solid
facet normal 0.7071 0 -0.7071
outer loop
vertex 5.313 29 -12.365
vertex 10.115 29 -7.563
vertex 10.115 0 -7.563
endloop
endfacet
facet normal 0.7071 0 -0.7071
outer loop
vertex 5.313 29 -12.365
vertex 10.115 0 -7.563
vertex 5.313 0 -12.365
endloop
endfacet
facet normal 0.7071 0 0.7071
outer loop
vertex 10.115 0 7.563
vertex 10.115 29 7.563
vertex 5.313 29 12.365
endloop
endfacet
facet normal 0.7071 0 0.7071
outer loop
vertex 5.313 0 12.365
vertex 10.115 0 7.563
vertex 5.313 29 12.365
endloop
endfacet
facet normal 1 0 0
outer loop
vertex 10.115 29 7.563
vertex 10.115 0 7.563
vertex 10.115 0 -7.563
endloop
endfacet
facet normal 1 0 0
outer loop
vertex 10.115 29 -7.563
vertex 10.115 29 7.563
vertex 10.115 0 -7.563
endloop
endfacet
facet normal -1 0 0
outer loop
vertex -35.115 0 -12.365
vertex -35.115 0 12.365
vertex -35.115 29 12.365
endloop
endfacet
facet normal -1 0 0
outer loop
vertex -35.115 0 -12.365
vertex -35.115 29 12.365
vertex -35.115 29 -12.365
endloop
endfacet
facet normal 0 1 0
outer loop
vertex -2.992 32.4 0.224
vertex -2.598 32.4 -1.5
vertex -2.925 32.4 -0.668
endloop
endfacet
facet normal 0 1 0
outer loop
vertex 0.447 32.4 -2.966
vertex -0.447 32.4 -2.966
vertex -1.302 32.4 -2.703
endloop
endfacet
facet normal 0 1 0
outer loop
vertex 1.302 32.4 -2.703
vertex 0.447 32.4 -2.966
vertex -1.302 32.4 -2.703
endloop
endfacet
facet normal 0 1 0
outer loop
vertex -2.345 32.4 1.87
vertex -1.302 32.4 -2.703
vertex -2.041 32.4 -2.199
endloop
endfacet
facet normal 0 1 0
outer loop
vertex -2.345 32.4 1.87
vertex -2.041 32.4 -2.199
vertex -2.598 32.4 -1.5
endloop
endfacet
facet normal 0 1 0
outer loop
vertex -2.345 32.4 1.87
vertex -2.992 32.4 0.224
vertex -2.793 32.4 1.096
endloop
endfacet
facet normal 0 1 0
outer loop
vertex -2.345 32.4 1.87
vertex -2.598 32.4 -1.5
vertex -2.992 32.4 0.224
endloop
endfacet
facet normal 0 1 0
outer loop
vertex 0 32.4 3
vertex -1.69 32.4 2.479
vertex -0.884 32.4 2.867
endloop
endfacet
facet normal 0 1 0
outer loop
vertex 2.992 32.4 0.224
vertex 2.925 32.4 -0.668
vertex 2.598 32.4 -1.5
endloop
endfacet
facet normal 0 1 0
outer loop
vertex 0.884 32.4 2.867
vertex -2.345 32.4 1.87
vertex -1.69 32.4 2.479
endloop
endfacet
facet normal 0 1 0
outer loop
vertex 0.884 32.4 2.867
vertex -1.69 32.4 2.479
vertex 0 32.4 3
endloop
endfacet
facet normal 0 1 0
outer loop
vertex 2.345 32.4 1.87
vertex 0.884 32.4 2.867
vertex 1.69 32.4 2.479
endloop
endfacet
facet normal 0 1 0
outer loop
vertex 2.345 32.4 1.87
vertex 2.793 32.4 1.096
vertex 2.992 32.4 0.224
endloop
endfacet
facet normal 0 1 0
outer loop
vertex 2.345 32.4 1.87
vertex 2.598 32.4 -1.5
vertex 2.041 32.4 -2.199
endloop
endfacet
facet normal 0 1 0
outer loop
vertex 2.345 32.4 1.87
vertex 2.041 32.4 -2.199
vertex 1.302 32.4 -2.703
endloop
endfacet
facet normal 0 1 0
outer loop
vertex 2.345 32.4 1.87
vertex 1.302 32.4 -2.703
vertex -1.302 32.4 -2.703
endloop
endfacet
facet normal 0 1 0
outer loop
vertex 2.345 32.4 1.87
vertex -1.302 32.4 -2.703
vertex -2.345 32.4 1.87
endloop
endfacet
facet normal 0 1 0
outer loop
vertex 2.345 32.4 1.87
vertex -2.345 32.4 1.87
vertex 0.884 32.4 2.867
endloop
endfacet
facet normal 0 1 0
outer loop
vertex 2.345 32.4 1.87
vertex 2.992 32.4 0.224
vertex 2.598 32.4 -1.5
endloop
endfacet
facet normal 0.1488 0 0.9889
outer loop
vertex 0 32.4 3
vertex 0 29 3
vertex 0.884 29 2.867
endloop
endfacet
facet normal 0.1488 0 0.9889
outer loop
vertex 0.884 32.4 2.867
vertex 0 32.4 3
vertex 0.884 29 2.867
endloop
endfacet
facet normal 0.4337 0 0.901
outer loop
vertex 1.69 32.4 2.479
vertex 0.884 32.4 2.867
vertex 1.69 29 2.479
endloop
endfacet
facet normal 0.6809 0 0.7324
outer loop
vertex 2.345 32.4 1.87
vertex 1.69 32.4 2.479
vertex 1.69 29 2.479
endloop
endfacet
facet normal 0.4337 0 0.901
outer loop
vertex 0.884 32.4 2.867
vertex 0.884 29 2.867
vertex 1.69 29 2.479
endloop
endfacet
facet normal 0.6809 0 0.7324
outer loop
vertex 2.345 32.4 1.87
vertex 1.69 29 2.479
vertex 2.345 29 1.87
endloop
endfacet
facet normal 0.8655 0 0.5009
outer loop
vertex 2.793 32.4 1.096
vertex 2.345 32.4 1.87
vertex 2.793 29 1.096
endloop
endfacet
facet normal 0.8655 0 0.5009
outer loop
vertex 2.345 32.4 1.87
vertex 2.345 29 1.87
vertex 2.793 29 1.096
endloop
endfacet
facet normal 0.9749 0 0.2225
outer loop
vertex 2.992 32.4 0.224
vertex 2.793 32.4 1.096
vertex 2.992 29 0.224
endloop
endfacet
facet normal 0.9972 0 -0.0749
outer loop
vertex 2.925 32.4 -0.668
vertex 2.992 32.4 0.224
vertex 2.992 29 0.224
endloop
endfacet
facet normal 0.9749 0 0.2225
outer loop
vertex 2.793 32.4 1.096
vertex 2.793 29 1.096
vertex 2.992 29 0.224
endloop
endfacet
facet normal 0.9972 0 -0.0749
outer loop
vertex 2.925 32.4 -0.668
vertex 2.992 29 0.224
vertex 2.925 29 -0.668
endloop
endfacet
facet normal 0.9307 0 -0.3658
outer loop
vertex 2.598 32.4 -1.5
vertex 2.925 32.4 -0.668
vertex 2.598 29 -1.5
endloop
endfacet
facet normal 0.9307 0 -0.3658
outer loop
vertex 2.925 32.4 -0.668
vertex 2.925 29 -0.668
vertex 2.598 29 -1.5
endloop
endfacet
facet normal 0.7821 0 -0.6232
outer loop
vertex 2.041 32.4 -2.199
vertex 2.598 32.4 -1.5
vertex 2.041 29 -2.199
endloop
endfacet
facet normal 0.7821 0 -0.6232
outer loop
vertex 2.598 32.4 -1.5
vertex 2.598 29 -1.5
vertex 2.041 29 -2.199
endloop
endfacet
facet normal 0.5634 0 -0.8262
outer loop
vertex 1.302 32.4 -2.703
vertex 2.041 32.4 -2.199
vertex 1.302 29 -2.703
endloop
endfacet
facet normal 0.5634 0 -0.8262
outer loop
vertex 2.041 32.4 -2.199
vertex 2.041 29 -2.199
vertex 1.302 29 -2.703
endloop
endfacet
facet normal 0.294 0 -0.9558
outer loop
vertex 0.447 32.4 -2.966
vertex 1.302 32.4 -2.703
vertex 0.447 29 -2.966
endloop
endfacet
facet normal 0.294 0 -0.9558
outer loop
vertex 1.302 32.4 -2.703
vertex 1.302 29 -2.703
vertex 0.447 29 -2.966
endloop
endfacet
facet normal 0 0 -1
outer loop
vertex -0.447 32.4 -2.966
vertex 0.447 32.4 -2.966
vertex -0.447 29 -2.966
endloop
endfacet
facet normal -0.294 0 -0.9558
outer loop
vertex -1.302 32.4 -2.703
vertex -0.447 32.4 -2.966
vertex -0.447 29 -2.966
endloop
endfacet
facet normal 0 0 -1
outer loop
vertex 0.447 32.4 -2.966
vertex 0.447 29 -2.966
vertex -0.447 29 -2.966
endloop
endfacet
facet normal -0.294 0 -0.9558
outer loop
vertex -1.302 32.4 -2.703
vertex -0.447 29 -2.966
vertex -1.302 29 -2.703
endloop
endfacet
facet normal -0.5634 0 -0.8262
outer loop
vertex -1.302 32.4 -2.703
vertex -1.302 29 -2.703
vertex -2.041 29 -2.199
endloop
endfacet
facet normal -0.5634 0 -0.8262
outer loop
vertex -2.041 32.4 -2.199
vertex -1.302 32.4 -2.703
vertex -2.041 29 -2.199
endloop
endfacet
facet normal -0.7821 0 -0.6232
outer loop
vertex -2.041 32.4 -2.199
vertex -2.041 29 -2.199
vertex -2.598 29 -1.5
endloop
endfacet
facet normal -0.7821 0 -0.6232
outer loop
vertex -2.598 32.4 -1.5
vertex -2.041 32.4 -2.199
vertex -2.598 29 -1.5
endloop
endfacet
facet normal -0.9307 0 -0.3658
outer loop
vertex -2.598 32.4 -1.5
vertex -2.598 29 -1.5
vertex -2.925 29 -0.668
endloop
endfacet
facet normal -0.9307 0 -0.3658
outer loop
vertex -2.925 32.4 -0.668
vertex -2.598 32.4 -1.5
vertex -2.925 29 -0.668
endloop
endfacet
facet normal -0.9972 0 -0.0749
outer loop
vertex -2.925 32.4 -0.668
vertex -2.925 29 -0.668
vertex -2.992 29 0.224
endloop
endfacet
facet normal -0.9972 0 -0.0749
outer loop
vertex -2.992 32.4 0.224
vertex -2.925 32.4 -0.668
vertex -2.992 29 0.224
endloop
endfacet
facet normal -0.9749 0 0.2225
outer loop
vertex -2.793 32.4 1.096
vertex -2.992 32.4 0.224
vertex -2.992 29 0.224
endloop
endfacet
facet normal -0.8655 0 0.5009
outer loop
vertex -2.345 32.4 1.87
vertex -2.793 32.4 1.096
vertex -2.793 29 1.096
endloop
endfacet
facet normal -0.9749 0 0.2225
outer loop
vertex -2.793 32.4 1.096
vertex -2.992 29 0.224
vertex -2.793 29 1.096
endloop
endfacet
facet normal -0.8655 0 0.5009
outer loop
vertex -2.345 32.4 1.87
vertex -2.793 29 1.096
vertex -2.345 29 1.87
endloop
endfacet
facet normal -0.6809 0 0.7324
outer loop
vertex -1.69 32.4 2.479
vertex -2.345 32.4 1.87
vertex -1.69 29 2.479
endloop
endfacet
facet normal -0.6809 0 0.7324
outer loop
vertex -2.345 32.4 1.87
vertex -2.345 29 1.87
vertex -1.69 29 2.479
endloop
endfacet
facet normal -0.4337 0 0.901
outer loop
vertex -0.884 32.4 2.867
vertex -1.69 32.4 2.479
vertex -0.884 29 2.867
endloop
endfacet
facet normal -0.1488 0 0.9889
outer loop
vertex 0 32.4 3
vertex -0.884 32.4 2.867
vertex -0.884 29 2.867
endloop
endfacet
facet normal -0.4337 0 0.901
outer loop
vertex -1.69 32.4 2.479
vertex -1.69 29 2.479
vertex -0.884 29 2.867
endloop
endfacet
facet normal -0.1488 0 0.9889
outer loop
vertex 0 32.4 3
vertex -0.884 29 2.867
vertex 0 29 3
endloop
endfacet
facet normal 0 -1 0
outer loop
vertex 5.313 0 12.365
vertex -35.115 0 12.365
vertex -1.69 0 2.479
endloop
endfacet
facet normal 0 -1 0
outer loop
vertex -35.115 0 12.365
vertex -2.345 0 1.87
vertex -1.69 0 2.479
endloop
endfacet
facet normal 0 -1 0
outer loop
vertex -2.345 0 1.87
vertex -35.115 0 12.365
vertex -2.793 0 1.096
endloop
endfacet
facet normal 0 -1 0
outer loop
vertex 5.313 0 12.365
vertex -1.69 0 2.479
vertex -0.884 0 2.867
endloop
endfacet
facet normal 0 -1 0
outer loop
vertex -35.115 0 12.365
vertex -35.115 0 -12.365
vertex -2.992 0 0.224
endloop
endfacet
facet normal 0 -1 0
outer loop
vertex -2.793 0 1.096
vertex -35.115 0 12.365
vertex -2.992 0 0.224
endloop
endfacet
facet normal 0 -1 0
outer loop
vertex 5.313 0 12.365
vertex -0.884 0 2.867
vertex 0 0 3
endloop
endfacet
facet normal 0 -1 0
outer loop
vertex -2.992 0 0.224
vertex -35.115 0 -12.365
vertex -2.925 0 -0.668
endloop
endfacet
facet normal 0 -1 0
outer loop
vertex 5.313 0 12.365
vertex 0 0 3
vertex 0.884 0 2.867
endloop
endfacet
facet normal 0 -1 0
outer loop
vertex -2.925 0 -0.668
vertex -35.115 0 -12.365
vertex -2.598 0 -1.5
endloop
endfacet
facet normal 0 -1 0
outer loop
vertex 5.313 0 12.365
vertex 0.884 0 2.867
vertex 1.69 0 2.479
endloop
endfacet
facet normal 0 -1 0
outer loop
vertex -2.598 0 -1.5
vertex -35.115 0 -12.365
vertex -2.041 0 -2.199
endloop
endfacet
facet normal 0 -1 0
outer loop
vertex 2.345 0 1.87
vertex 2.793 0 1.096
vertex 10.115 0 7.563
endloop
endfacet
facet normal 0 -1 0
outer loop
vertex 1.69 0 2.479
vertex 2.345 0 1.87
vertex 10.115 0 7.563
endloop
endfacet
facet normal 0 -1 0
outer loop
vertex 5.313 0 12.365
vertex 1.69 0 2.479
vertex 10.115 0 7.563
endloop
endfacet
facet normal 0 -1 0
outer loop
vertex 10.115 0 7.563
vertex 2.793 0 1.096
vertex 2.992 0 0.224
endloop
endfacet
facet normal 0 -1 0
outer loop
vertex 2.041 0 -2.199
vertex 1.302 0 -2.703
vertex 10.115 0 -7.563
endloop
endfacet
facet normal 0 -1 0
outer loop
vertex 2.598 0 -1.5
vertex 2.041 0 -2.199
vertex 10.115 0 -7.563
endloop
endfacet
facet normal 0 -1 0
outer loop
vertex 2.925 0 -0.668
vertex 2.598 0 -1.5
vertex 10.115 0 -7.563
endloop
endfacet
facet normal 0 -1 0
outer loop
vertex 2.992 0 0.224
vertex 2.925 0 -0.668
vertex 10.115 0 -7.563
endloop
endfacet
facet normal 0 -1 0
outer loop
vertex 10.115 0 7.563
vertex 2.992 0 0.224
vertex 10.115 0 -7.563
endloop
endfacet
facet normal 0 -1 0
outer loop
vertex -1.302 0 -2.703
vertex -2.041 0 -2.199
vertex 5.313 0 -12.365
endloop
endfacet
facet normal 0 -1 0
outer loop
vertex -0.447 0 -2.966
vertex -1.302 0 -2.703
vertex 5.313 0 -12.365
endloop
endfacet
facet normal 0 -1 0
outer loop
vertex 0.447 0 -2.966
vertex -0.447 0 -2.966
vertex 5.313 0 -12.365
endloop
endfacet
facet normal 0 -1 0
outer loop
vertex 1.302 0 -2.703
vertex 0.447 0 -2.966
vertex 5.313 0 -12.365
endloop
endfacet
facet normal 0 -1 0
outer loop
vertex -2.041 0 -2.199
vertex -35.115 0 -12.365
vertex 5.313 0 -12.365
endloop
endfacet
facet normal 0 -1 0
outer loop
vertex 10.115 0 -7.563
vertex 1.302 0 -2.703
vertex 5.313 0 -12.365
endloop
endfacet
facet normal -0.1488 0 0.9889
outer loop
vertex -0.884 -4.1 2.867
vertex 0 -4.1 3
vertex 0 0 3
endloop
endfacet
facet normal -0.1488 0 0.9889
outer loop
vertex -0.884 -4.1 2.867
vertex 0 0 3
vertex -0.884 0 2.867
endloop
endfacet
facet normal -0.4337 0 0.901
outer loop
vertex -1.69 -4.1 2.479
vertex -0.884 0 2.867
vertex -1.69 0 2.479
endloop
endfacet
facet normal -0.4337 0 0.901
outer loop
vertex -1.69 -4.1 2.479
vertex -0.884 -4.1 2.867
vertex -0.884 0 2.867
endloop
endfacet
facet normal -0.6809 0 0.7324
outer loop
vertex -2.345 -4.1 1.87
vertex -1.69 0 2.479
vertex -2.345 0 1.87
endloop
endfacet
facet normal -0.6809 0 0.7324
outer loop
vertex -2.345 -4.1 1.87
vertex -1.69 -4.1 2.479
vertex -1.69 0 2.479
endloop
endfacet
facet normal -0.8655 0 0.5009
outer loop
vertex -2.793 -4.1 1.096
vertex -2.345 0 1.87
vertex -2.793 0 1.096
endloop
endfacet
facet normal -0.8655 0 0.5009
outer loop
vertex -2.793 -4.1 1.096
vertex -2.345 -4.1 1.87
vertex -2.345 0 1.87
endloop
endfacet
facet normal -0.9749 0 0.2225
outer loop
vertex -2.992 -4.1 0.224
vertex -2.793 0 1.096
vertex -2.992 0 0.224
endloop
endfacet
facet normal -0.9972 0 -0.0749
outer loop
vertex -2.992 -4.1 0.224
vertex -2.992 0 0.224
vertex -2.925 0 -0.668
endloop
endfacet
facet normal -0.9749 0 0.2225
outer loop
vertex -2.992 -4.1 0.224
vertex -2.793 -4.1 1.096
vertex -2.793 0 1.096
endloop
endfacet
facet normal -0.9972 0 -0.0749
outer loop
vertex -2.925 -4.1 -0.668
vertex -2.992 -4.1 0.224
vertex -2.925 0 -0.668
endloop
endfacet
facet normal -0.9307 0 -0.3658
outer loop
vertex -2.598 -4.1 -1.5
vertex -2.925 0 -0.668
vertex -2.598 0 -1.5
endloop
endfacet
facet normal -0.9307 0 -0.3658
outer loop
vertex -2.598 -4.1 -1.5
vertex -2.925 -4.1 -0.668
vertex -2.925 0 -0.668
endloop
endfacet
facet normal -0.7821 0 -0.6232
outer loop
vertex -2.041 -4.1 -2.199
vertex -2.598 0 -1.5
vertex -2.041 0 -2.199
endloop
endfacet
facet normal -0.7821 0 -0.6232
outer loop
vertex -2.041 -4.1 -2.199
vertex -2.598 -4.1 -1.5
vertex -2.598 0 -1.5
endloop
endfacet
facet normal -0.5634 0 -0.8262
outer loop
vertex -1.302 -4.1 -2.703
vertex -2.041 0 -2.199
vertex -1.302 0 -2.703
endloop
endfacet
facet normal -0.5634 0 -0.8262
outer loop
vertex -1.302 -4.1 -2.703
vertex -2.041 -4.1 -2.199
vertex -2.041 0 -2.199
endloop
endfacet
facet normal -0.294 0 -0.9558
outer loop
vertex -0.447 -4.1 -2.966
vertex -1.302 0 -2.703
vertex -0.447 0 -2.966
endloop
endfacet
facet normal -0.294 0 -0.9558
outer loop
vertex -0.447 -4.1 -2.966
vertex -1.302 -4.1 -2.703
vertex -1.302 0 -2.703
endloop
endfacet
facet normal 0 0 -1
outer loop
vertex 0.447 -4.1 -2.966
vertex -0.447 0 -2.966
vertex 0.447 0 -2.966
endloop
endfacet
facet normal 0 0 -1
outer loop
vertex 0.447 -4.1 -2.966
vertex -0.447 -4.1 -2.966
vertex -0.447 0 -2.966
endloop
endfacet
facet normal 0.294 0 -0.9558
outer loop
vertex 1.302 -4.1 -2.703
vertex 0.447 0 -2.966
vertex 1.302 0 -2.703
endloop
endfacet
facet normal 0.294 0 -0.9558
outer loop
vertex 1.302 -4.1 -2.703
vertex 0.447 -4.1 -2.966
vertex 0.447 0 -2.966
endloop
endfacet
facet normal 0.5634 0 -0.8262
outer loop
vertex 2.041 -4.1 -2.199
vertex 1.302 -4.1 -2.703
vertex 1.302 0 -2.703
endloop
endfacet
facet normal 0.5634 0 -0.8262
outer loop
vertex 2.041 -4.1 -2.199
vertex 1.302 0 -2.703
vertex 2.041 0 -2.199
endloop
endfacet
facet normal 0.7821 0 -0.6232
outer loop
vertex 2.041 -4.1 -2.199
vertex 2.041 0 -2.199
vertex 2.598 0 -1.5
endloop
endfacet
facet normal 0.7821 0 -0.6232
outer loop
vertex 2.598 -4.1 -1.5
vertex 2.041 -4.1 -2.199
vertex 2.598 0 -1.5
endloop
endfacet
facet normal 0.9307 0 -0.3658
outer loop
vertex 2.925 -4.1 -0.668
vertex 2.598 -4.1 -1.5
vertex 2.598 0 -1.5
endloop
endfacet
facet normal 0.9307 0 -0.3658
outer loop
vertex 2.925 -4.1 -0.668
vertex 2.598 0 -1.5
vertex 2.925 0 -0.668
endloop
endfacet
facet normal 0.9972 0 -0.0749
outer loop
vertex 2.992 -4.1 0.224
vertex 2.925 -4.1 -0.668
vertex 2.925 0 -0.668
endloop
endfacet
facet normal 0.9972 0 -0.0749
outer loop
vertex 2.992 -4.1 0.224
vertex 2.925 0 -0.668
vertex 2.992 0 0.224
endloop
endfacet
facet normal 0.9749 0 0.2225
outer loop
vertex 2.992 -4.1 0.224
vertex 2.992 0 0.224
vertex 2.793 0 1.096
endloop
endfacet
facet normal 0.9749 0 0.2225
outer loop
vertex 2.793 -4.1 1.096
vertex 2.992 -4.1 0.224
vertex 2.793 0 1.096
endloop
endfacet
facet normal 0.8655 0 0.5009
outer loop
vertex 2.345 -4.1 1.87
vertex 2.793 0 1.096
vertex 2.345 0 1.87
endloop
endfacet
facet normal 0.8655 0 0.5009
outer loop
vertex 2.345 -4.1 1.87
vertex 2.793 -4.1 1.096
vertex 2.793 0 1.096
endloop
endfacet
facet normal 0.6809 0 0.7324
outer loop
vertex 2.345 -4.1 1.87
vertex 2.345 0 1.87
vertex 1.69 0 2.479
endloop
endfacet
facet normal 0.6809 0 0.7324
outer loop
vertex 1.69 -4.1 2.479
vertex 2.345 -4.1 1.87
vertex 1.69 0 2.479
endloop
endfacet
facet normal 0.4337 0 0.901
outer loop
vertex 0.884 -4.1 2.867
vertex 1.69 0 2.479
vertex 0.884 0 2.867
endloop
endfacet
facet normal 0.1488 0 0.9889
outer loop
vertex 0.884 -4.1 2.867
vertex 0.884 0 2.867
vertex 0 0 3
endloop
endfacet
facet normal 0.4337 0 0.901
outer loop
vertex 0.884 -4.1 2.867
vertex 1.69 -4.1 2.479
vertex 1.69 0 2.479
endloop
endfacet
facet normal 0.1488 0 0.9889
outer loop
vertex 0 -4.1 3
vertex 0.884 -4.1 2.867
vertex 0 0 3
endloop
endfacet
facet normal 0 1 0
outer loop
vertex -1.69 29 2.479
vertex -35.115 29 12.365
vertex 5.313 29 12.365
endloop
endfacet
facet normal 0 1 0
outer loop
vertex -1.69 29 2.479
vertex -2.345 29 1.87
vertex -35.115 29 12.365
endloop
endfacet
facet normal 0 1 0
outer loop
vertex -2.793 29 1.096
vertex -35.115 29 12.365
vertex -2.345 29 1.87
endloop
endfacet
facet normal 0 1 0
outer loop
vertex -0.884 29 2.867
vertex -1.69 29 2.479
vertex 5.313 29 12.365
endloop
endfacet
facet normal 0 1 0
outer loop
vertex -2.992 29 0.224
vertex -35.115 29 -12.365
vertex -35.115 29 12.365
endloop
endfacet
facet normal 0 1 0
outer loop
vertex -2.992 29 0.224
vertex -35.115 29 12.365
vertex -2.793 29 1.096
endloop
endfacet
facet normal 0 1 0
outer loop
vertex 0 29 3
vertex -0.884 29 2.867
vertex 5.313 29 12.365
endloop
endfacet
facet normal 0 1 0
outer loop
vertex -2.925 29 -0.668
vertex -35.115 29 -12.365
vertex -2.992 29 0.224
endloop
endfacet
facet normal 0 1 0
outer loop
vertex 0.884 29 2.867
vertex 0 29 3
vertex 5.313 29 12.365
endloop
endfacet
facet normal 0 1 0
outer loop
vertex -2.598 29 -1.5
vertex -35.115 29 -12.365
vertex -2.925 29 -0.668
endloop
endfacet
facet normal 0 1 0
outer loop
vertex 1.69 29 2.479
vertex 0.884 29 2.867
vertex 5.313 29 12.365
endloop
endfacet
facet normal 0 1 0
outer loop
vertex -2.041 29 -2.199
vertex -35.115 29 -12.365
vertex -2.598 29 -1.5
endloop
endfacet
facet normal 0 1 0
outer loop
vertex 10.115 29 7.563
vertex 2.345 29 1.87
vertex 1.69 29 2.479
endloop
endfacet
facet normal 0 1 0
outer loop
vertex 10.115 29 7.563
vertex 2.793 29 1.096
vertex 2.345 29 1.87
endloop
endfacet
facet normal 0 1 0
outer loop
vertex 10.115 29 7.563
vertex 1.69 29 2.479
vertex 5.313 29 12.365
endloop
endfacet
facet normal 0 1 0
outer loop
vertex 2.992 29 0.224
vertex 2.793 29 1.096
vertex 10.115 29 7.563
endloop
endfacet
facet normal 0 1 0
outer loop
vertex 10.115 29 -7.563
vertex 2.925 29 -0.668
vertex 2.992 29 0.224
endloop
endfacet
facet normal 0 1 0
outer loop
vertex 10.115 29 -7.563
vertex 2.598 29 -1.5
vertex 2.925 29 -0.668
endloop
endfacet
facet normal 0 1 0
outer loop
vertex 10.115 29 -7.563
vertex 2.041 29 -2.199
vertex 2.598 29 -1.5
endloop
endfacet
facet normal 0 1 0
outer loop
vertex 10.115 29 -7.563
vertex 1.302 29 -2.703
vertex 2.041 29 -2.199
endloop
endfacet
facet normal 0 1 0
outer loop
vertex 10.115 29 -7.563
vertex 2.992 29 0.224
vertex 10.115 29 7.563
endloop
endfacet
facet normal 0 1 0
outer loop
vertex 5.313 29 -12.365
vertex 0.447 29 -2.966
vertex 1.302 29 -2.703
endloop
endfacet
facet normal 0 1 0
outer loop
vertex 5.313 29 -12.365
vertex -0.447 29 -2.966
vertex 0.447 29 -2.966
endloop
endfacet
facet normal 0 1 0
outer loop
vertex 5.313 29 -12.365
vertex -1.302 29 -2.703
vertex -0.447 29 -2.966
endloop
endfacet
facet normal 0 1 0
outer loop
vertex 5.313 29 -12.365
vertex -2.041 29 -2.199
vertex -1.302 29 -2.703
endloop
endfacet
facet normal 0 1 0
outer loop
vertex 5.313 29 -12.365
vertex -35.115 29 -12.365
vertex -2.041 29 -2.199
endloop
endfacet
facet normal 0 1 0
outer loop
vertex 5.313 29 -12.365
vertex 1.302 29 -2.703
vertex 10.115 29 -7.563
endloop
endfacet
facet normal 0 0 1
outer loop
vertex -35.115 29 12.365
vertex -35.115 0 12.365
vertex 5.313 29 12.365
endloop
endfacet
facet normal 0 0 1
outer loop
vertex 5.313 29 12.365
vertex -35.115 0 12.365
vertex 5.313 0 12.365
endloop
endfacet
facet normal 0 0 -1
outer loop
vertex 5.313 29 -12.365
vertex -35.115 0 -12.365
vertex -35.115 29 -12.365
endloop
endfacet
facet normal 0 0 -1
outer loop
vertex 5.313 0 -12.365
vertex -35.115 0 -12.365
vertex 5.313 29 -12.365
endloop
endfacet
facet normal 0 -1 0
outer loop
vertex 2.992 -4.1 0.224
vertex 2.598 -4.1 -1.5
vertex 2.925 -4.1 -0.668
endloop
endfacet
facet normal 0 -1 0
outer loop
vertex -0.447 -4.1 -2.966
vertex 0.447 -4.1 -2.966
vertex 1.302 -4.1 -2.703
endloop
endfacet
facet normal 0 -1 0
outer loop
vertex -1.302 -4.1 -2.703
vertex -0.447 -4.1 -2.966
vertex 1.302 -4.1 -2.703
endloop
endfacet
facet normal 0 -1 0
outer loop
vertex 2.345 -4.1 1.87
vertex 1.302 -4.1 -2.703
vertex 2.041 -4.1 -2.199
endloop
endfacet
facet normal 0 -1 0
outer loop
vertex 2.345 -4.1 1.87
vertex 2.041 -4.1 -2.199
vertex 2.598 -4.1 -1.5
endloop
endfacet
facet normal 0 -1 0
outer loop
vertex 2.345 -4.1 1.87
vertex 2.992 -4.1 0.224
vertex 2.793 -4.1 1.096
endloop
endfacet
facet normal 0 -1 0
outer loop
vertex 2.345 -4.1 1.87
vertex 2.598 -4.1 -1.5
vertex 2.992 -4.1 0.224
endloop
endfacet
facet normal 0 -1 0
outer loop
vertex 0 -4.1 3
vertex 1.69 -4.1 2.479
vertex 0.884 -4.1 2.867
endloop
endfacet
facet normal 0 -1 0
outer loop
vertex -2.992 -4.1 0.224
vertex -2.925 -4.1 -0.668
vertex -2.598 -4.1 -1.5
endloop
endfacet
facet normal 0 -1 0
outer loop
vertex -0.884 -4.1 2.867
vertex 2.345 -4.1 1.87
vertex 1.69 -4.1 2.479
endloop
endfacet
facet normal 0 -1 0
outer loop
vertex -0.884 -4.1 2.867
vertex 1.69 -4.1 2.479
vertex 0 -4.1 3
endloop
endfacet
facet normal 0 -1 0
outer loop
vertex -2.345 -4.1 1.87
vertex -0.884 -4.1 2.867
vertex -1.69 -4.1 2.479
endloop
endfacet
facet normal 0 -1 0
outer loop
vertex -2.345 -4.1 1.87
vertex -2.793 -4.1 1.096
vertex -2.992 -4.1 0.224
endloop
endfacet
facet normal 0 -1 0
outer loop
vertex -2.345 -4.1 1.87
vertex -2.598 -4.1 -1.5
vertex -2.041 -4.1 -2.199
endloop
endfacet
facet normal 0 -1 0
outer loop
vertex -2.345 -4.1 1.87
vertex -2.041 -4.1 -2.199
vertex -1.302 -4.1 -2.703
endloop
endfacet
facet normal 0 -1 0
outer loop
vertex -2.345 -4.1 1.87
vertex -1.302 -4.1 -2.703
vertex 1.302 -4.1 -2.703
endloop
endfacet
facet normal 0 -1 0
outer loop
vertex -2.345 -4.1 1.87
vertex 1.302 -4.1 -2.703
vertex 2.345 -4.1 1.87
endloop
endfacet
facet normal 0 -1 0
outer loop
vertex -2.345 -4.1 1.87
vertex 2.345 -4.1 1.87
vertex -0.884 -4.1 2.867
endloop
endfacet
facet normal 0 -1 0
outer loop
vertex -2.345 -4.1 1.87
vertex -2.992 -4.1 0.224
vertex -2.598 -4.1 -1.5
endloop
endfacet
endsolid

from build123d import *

# Parameters (mm, degrees)
SKETCH_1_W          = 45.23
SKETCH_1_H          = 24.73
EXTRUDE_1_DEPTH     = 29
SKETCH_2_R          = 3
EXTRUDE_2_DEPTH     = 3.4
EXTRUDE_START       = 4.1
SKETCH_3_R          = 3
EXTRUDE_3_DEPTH     = 4.1
CUT_EXTRUDE_1_DEPTH = 50.815323446


with BuildPart() as part:
    # ｽｹｯﾁ1 → ﾎﾞｽ - 押し出し1 (new body)
    with BuildSketch(Plane(origin=(0, 0, 0), x_dir=(1, 0, 0), z_dir=(0, 1, 0))):
        with Locations((-12.5, 0)):
            Rectangle(SKETCH_1_W, SKETCH_1_H)
    extrude(amount=EXTRUDE_1_DEPTH)

    # ｽｹｯﾁ2 → ﾎﾞｽ - 押し出し2 (add)
    with BuildSketch(Plane(origin=(0, 29, 0), x_dir=(1, 0, 0), z_dir=(0, 1, 0))):
        with Locations(Location((0, 0, 0), (0, 0, 270))):
            Circle(SKETCH_2_R)
    extrude(amount=EXTRUDE_2_DEPTH)

    # ｽｹｯﾁ3 → ﾎﾞｽ - 押し出し3 (add)
    with BuildSketch(Plane.XZ.offset(EXTRUDE_START)):
        with Locations(Location((0, 0, 0), (0, 0, 90))):
            Circle(SKETCH_3_R)
    extrude(amount=-EXTRUDE_3_DEPTH)

    # ｽｹｯﾁ4 → ｶｯﾄ - 押し出し1 (cut, through all)
    with BuildSketch(Plane(origin=(0, 29, 0), x_dir=(1, 0, 0), z_dir=(0, 1, 0))):
        Polygon((5.31266953, 12.365), (10.115, 12.365), (10.115, 7.56266953), align=None)
        Polygon((5.31266953, -12.365), (10.115, -12.365), (10.115, -7.56266953), align=None)
    extrude(amount=-CUT_EXTRUDE_1_DEPTH, mode=Mode.SUBTRACT)


solid = part.part
